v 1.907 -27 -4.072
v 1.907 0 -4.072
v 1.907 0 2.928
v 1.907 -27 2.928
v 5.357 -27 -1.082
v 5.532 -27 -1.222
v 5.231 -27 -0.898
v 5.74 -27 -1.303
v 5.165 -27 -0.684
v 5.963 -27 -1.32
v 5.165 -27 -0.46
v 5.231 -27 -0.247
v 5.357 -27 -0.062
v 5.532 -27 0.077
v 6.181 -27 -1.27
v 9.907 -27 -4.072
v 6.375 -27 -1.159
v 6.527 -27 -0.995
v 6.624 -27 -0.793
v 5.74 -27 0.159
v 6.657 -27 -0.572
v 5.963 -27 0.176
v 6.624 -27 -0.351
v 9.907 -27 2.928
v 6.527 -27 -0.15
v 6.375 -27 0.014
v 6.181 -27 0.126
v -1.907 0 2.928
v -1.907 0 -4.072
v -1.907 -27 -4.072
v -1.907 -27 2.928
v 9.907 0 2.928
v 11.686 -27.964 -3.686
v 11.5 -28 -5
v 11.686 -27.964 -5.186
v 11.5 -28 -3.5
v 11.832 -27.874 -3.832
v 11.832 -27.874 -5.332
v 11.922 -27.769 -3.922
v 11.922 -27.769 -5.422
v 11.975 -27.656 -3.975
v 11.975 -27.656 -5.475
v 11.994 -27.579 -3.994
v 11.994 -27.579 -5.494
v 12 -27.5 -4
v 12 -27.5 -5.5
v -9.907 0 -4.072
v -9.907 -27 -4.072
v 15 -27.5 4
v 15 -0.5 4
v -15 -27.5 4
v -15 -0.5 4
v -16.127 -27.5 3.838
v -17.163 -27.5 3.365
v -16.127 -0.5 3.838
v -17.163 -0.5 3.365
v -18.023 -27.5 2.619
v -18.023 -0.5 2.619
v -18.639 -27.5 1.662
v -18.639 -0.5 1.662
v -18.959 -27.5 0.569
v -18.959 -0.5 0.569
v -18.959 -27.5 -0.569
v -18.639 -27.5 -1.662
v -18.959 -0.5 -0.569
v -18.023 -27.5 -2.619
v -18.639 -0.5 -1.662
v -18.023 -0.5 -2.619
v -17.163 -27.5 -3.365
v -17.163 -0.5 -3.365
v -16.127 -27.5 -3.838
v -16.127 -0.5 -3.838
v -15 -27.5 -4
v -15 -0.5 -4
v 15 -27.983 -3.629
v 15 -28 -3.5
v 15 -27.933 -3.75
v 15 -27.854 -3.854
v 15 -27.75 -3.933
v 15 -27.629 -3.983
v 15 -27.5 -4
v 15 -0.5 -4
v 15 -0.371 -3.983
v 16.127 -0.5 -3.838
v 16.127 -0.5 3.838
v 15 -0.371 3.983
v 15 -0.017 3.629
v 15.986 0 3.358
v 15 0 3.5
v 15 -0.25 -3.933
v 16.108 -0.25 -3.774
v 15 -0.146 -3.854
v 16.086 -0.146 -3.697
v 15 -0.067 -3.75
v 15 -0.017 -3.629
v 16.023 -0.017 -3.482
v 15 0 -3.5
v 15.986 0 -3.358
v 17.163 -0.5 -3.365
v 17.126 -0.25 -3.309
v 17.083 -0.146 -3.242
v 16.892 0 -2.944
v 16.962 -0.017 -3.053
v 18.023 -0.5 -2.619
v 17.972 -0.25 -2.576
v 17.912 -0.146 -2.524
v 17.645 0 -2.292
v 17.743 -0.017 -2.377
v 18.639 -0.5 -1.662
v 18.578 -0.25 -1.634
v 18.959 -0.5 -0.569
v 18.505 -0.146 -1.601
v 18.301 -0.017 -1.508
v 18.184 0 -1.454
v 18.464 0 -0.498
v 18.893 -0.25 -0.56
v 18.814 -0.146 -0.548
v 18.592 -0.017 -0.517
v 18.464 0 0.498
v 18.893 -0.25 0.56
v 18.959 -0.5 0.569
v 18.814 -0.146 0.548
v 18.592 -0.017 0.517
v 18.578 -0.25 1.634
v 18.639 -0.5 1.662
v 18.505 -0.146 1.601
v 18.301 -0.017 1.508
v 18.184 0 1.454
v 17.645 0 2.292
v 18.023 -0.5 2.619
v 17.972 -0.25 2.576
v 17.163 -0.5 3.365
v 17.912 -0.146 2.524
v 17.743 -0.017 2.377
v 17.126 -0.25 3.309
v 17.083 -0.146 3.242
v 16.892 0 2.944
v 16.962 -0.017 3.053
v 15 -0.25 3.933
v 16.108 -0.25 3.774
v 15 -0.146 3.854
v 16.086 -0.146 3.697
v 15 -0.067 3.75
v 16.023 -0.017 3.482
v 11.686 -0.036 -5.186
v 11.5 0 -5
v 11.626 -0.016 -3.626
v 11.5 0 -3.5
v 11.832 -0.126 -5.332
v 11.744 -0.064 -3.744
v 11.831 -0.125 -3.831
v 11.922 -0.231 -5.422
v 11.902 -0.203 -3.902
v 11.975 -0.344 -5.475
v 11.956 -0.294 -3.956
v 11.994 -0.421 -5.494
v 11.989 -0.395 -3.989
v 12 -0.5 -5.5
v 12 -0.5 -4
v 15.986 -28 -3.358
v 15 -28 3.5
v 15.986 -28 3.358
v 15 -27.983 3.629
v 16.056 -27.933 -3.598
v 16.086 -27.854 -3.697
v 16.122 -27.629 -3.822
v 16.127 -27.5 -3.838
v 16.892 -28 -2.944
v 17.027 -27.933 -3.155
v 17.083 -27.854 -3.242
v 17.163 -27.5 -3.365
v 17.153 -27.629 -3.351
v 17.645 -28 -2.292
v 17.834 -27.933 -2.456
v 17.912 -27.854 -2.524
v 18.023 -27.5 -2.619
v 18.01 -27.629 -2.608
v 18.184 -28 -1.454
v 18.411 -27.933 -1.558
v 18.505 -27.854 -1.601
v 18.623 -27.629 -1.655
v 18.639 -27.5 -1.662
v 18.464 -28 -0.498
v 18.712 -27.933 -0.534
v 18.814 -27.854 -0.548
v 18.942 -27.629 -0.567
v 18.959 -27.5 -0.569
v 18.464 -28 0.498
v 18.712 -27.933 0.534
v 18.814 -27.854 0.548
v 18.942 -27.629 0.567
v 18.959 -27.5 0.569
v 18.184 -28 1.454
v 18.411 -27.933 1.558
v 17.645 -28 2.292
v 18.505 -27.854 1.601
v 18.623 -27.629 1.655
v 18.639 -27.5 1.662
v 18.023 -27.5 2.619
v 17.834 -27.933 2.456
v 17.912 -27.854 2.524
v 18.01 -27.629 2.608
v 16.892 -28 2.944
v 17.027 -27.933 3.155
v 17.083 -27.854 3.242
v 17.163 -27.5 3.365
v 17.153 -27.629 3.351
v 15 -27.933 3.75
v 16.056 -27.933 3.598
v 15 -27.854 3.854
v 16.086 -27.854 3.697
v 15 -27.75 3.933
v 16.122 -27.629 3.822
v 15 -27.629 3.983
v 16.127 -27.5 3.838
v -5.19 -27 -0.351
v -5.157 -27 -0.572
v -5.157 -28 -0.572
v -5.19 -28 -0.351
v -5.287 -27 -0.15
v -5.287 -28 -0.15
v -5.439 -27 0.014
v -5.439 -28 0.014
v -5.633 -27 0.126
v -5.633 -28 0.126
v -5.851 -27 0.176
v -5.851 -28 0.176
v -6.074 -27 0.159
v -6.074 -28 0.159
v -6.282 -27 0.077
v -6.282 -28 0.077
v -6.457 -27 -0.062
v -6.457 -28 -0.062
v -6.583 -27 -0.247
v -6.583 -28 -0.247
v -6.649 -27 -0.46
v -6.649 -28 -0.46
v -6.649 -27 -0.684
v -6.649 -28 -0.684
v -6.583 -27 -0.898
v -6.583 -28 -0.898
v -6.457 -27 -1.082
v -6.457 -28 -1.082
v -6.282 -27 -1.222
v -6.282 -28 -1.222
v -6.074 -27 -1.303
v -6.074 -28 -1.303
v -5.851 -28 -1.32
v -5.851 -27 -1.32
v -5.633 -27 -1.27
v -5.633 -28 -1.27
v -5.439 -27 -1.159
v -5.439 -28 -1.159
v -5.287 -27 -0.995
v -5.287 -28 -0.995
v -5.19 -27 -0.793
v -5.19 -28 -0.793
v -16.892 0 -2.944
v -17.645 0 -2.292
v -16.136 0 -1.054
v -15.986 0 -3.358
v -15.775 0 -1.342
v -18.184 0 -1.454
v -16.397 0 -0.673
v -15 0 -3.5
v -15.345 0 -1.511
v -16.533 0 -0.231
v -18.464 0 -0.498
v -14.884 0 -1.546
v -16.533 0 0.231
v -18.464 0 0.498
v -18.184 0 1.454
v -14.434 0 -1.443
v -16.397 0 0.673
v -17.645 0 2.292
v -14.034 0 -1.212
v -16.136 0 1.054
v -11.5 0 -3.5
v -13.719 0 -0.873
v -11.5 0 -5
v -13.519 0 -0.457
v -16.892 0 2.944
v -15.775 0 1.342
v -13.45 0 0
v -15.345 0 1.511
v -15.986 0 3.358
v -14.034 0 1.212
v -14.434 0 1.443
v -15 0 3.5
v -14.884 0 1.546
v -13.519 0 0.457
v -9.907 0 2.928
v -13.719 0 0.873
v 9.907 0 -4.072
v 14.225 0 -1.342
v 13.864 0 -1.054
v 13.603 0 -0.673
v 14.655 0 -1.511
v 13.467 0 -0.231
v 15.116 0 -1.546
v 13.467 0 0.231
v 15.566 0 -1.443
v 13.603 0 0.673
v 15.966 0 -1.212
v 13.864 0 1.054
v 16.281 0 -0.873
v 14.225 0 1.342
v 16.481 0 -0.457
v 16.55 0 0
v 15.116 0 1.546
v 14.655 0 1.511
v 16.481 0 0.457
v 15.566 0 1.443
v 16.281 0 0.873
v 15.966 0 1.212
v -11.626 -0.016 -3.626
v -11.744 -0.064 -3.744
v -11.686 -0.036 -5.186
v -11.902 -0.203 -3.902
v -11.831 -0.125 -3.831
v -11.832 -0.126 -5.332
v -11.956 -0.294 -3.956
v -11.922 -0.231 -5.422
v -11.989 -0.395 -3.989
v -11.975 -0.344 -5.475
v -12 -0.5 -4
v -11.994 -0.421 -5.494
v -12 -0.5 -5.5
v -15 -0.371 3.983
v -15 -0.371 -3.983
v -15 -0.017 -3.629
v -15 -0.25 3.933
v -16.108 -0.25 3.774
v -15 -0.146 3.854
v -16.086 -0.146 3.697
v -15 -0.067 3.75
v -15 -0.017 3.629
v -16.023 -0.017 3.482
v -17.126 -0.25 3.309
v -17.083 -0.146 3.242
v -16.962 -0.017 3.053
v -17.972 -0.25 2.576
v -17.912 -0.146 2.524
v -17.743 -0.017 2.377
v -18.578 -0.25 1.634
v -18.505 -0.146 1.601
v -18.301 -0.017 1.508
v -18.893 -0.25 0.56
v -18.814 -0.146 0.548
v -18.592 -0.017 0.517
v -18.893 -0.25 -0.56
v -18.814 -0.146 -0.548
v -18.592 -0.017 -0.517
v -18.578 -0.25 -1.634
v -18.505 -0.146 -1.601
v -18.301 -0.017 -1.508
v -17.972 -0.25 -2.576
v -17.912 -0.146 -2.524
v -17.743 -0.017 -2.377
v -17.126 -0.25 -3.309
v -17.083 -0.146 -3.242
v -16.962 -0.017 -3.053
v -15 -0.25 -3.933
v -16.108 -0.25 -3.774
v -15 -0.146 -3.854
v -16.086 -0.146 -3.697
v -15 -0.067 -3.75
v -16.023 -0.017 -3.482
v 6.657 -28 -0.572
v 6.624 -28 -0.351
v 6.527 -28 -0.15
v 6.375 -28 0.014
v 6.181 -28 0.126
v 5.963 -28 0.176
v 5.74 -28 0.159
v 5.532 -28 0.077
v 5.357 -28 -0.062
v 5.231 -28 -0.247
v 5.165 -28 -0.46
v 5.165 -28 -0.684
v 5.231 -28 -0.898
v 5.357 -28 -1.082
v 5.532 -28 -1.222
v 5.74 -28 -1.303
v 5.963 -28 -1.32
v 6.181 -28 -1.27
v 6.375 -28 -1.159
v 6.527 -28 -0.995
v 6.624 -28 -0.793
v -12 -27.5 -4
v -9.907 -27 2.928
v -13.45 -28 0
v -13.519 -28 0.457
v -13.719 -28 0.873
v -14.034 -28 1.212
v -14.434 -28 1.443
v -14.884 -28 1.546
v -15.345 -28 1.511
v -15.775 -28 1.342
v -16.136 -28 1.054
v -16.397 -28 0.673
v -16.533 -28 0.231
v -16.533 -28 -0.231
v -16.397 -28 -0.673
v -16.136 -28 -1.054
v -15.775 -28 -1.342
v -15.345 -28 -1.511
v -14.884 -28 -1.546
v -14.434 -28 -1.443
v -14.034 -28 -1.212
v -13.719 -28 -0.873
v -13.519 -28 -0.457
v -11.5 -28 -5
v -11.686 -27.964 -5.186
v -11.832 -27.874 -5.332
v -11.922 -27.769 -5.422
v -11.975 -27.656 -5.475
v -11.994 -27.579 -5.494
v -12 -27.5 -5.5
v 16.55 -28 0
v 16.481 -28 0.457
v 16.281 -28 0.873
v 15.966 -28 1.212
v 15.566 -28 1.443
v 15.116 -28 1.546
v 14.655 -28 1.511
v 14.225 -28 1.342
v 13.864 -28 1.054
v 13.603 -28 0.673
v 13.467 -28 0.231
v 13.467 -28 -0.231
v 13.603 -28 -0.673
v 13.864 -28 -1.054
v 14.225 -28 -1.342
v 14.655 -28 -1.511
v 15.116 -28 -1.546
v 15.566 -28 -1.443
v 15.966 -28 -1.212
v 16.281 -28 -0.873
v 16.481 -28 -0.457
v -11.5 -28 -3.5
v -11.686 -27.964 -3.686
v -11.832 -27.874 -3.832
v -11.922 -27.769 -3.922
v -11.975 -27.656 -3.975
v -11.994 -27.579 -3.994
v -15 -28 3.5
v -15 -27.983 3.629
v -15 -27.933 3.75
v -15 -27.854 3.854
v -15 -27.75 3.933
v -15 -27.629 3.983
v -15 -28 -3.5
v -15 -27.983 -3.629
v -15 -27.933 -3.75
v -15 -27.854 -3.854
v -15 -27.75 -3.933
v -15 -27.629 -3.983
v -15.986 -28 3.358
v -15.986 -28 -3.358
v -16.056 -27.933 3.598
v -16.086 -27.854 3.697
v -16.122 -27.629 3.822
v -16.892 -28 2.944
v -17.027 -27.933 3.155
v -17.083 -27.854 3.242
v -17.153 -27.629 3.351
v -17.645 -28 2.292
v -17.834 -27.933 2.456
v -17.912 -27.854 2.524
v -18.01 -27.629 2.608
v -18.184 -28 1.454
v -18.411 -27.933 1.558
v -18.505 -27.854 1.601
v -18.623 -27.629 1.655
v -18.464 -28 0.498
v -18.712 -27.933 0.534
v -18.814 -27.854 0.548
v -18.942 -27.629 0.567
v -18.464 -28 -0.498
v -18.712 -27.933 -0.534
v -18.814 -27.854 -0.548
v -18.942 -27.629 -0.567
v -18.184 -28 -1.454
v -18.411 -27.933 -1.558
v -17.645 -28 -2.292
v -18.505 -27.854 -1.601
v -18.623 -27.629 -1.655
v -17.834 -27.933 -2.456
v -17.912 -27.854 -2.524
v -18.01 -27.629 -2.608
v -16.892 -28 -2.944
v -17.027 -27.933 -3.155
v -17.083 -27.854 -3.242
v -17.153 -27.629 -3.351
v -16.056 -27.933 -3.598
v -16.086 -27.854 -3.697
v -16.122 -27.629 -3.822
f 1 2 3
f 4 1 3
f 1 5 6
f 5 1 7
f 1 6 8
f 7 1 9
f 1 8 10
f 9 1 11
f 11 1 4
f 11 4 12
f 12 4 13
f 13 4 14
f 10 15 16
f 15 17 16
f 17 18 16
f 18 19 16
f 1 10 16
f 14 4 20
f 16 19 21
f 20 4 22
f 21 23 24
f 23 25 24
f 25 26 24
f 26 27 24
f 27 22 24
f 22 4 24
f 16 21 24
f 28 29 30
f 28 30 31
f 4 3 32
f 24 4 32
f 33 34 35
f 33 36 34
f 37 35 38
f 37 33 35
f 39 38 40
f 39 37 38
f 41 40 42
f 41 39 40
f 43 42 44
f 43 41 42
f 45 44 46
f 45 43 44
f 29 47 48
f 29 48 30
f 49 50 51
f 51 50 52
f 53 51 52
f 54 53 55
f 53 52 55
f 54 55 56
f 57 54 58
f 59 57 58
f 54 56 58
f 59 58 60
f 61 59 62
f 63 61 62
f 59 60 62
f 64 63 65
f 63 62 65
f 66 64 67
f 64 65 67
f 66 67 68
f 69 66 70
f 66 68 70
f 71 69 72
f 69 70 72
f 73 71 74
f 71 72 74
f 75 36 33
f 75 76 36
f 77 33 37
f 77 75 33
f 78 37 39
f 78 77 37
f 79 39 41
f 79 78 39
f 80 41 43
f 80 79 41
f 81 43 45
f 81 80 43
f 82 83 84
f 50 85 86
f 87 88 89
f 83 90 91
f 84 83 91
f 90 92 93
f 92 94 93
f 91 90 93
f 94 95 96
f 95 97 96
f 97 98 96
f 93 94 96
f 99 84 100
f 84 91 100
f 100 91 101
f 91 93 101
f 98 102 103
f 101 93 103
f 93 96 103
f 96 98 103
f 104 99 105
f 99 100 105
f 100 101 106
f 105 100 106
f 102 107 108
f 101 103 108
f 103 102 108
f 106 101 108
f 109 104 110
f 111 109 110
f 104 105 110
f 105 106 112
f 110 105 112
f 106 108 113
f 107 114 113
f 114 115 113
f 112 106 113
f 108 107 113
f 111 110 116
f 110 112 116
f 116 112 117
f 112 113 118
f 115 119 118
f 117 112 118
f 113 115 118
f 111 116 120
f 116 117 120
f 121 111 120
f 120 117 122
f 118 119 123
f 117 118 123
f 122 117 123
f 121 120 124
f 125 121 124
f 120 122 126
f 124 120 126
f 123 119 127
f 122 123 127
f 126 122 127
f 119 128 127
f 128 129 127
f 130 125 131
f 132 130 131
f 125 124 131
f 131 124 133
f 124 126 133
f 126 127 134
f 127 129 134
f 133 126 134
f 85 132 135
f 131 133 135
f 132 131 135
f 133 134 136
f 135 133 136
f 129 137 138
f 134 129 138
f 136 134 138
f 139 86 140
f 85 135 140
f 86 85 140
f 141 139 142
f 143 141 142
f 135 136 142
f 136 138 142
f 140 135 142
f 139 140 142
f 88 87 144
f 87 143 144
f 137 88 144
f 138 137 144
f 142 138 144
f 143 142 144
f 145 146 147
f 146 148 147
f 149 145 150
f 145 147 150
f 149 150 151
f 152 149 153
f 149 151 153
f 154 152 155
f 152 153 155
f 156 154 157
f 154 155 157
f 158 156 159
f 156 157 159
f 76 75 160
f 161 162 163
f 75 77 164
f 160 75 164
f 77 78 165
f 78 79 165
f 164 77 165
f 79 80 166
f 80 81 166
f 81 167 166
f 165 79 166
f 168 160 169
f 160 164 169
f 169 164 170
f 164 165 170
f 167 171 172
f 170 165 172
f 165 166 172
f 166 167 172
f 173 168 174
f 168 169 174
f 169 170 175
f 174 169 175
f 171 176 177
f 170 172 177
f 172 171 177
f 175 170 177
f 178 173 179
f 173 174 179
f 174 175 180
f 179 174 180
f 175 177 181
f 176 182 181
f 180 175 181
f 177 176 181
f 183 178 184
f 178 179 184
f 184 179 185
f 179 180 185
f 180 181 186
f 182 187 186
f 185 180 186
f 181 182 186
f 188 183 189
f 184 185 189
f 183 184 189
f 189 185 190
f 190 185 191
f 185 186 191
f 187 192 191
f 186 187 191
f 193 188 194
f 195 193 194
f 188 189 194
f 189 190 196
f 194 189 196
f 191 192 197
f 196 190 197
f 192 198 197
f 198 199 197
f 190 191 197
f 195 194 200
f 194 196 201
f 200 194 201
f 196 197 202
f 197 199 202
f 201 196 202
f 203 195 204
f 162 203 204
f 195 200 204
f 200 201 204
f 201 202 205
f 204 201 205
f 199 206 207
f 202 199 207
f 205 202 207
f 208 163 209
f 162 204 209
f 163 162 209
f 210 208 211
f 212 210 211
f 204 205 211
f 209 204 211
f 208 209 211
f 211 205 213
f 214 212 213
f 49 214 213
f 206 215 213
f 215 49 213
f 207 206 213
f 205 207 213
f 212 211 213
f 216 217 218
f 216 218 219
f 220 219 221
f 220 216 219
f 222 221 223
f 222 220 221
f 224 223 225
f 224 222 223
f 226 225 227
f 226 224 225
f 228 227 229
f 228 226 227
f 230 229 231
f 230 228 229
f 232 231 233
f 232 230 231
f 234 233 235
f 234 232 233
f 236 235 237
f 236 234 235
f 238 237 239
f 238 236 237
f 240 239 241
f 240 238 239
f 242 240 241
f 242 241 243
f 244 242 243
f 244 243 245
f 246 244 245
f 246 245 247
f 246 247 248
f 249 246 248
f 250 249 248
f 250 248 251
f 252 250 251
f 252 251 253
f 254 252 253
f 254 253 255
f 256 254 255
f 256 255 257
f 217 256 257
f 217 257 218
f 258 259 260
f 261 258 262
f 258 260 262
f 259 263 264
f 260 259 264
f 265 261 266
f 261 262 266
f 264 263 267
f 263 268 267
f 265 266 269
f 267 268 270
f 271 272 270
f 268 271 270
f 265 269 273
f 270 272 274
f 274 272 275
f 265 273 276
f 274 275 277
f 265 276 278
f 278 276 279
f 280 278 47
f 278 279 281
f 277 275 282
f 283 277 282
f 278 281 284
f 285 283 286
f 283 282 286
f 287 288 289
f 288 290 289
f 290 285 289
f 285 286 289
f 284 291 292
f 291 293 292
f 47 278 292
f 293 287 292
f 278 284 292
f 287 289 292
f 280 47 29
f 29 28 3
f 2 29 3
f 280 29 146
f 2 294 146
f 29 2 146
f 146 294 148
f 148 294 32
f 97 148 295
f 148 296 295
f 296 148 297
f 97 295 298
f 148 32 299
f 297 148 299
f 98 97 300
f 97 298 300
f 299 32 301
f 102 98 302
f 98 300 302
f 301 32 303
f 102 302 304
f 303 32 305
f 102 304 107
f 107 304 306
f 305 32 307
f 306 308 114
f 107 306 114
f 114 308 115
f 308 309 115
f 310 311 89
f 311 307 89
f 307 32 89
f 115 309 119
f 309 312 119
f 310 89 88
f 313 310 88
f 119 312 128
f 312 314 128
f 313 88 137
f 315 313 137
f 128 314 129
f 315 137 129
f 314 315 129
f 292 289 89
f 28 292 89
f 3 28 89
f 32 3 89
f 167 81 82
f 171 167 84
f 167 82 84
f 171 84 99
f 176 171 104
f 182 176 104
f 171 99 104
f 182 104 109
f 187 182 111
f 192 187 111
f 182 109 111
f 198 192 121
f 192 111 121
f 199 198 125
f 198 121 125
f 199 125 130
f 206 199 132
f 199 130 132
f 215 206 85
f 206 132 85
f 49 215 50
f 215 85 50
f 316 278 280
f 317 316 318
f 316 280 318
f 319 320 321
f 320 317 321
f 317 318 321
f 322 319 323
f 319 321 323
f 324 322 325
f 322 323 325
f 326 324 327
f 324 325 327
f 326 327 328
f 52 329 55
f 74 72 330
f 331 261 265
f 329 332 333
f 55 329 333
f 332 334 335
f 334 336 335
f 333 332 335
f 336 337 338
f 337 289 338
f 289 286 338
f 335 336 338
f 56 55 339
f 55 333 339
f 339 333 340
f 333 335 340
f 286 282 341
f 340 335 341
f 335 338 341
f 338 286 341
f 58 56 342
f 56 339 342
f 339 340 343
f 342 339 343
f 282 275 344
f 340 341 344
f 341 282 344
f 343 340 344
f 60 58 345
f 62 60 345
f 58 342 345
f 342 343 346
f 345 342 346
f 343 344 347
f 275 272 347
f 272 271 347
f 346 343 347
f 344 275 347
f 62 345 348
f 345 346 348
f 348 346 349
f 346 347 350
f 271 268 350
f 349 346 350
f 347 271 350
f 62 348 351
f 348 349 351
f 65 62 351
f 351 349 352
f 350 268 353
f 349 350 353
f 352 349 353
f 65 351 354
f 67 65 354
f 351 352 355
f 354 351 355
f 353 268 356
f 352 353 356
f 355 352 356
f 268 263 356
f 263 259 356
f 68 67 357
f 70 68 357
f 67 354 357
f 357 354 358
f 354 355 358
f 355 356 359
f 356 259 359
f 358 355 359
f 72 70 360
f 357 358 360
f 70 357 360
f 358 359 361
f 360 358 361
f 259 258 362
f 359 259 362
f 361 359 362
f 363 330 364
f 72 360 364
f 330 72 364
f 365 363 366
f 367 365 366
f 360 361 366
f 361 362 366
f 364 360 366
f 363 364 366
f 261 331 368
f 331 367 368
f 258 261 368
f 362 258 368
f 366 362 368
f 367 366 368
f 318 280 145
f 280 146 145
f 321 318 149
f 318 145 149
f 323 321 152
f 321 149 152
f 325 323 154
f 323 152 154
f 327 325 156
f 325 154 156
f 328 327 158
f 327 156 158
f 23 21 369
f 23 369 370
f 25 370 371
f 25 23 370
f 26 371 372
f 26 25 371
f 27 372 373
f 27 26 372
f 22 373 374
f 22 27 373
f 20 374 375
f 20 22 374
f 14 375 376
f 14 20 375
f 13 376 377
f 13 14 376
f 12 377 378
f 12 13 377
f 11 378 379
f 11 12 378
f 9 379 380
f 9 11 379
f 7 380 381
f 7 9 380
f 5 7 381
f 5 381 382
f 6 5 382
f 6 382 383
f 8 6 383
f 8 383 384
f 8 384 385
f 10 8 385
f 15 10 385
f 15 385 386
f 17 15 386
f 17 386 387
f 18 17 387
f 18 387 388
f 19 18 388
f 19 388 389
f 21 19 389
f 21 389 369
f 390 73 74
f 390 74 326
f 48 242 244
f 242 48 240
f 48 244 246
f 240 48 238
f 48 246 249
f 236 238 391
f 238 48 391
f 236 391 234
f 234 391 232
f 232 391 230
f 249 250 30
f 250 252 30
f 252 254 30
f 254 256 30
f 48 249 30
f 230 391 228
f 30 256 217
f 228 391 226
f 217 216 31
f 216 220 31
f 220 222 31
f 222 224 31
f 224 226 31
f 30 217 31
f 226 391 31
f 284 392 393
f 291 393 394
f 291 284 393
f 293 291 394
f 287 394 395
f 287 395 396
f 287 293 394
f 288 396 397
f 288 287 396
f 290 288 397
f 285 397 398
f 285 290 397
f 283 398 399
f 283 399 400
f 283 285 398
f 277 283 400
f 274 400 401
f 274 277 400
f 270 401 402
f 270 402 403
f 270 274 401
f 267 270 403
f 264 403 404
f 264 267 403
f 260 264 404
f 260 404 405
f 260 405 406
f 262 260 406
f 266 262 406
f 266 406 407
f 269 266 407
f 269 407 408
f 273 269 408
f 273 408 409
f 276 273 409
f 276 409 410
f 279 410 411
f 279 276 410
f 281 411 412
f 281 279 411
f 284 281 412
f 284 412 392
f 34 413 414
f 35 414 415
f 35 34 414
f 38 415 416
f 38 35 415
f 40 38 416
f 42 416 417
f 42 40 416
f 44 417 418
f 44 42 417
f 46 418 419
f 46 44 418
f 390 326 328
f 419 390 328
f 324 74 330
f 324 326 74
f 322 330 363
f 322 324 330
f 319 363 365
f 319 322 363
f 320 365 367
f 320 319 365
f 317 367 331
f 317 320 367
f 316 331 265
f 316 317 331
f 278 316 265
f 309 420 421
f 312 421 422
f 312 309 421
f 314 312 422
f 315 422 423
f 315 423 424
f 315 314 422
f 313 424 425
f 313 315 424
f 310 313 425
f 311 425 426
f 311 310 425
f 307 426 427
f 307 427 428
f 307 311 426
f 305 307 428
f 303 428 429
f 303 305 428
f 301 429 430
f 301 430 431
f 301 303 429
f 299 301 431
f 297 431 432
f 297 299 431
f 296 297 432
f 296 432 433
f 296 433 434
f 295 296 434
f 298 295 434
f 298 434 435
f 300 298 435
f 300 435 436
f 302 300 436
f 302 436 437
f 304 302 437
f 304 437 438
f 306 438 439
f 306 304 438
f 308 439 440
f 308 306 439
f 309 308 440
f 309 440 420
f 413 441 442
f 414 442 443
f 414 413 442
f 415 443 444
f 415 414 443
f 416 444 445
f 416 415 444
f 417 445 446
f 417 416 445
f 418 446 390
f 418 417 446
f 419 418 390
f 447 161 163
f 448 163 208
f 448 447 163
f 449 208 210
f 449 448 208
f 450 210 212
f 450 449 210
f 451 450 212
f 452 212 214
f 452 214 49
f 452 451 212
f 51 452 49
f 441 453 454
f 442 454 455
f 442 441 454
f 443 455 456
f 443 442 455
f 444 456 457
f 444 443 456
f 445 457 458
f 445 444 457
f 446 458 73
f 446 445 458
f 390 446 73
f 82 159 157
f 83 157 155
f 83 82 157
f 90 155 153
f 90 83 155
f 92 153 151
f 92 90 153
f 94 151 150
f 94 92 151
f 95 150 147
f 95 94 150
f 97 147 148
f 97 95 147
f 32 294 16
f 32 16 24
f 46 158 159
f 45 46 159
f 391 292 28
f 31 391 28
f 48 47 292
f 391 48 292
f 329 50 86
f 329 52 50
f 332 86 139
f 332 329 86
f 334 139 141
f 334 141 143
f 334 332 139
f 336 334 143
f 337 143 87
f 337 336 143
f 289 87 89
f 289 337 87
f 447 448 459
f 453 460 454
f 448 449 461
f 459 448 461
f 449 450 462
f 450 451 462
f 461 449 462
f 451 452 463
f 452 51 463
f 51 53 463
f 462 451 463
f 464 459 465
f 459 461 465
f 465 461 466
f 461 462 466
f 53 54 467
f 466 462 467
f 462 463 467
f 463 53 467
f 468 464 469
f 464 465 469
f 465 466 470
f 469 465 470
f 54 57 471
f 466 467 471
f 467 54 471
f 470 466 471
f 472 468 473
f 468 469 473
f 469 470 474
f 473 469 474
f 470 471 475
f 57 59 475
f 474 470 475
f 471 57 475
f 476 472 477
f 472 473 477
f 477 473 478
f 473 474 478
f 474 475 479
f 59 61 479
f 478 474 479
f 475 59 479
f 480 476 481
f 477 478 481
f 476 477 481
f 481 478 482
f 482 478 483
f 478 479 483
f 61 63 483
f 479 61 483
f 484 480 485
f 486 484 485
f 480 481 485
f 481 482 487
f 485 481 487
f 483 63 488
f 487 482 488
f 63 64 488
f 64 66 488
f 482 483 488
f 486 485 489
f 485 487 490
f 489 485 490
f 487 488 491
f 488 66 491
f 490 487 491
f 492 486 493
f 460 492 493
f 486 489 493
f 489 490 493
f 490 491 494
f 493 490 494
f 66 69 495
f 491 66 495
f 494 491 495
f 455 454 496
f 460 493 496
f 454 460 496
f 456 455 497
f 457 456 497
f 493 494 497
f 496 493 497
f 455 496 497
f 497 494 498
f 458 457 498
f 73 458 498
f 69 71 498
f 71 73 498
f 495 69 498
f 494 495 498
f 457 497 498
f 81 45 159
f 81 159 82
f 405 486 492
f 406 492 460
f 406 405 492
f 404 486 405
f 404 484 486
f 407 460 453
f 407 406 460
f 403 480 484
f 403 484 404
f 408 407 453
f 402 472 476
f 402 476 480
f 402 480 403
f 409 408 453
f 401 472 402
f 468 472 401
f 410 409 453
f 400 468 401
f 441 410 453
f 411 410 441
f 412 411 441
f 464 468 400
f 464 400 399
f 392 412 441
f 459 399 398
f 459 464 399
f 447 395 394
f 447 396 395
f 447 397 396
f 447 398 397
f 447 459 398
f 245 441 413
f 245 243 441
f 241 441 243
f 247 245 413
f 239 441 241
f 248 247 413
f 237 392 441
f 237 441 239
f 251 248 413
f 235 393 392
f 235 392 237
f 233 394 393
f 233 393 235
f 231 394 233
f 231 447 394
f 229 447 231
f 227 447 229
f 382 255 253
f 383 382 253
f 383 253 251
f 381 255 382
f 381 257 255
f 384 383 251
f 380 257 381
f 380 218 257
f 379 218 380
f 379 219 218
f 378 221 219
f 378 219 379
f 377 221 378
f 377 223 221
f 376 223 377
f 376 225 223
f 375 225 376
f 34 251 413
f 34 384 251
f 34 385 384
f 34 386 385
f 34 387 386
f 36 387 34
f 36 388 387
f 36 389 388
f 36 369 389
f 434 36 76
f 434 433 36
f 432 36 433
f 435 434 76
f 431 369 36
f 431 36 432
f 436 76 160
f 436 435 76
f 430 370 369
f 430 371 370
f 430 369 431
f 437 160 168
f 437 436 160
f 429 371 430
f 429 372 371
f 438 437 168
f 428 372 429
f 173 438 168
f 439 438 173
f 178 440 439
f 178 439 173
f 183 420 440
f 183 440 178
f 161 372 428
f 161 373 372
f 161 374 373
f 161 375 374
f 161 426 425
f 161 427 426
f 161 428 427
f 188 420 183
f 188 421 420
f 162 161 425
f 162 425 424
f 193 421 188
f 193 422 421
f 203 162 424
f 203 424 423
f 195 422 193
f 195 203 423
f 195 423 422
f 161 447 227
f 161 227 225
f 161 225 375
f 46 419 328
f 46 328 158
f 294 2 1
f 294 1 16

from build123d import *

# Parameters (mm, degrees)
F0_R     = 1.55
F0_W     = 8
F0_H     = 7
F0_R_2   = 0.75
F1_DEPTH = 28
F2_DEPTH = 27
F3_R     = 0.5
F4_R     = 0.5


with BuildPart() as f1:
    # F0 (on Front) → F1 (new body)
    with BuildSketch(Plane.XZ):
        with BuildLine():
            ThreePointArc((15, -4), (19, 0), (15, 4))
            Line((15, 4), (0, 4))
            Line((0, 4), (-15, 4))
            ThreePointArc((-15, 4), (-19, 0), (-15, -4))
            Line((-15, -4), (-12, -4))
            Line((-12, -4), (-12, -5))
            Line((-12, -5), (-12, -5.5))
            Line((-12, -5.5), (0, -5.5))
            Line((0, -5.5), (12, -5.5))
            Line((12, -5.5), (12, -5))
            Line((12, -5), (12, -4))
            Line((12, -4), (15, -4))
        make_face()
        with Locations((-15, 0)):
            Circle(F0_R, mode=Mode.SUBTRACT)
        with Locations((-5.906985, -0.57222)):
            Rectangle(F0_W, F0_H, mode=Mode.SUBTRACT)
        with Locations((5.906985, -0.57222)):
            Rectangle(F0_W, F0_H, mode=Mode.SUBTRACT)
        with Locations((15, 0)):
            Circle(F0_R, mode=Mode.SUBTRACT)
        with Locations((5.906985, -0.57222)):
            Rectangle(F0_W, F0_H)
        with Locations((5.906985, -0.57222)):
            Circle(F0_R_2, mode=Mode.SUBTRACT)
        with Locations((-5.906985, -0.57222)):
            Rectangle(F0_W, F0_H)
        with Locations((-5.906985, -0.57222)):
            Circle(F0_R_2, mode=Mode.SUBTRACT)
    extrude(amount=F1_DEPTH)

    # F0 (on Front) → F2 (cut)
    with BuildSketch(Plane.XZ):
        with Locations((5.906985, -0.57222)):
            Rectangle(F0_W, F0_H)
        with Locations((5.906985, -0.57222)):
            Circle(F0_R_2, mode=Mode.SUBTRACT)
        with Locations((-5.906985, -0.57222)):
            Rectangle(F0_W, F0_H)
        with Locations((-5.906985, -0.57222)):
            Circle(F0_R_2, mode=Mode.SUBTRACT)
    extrude(amount=F2_DEPTH, mode=Mode.SUBTRACT)

    # F3
    f3_edges = [f1.edges().sort_by_distance(p)[0] for p in [
        (0, 0, 4),
        (-13.5, 0, -4),
        (0, 0, -5.5),
        (-12, 0, -4.75),
        (12, 0, -4.75),
        (13.5, 0, -4),
        (19, 0, 0),
        (-19, 0, 0),
    ]]
    fillet(f3_edges, radius=F3_R)

    # F4
    f4_edges = [f1.edges().sort_by_distance(p)[0] for p in [
        (0, -28, 4),
        (-19, -28, 0),
        (-13.5, -28, -4),
        (-12, -28, -4.75),
        (0, -28, -5.5),
        (12, -28, -4.75),
        (13.5, -28, -4),
        (19, -28, 0),
    ]]
    fillet(f4_edges, radius=F4_R)


solid = f1.part
